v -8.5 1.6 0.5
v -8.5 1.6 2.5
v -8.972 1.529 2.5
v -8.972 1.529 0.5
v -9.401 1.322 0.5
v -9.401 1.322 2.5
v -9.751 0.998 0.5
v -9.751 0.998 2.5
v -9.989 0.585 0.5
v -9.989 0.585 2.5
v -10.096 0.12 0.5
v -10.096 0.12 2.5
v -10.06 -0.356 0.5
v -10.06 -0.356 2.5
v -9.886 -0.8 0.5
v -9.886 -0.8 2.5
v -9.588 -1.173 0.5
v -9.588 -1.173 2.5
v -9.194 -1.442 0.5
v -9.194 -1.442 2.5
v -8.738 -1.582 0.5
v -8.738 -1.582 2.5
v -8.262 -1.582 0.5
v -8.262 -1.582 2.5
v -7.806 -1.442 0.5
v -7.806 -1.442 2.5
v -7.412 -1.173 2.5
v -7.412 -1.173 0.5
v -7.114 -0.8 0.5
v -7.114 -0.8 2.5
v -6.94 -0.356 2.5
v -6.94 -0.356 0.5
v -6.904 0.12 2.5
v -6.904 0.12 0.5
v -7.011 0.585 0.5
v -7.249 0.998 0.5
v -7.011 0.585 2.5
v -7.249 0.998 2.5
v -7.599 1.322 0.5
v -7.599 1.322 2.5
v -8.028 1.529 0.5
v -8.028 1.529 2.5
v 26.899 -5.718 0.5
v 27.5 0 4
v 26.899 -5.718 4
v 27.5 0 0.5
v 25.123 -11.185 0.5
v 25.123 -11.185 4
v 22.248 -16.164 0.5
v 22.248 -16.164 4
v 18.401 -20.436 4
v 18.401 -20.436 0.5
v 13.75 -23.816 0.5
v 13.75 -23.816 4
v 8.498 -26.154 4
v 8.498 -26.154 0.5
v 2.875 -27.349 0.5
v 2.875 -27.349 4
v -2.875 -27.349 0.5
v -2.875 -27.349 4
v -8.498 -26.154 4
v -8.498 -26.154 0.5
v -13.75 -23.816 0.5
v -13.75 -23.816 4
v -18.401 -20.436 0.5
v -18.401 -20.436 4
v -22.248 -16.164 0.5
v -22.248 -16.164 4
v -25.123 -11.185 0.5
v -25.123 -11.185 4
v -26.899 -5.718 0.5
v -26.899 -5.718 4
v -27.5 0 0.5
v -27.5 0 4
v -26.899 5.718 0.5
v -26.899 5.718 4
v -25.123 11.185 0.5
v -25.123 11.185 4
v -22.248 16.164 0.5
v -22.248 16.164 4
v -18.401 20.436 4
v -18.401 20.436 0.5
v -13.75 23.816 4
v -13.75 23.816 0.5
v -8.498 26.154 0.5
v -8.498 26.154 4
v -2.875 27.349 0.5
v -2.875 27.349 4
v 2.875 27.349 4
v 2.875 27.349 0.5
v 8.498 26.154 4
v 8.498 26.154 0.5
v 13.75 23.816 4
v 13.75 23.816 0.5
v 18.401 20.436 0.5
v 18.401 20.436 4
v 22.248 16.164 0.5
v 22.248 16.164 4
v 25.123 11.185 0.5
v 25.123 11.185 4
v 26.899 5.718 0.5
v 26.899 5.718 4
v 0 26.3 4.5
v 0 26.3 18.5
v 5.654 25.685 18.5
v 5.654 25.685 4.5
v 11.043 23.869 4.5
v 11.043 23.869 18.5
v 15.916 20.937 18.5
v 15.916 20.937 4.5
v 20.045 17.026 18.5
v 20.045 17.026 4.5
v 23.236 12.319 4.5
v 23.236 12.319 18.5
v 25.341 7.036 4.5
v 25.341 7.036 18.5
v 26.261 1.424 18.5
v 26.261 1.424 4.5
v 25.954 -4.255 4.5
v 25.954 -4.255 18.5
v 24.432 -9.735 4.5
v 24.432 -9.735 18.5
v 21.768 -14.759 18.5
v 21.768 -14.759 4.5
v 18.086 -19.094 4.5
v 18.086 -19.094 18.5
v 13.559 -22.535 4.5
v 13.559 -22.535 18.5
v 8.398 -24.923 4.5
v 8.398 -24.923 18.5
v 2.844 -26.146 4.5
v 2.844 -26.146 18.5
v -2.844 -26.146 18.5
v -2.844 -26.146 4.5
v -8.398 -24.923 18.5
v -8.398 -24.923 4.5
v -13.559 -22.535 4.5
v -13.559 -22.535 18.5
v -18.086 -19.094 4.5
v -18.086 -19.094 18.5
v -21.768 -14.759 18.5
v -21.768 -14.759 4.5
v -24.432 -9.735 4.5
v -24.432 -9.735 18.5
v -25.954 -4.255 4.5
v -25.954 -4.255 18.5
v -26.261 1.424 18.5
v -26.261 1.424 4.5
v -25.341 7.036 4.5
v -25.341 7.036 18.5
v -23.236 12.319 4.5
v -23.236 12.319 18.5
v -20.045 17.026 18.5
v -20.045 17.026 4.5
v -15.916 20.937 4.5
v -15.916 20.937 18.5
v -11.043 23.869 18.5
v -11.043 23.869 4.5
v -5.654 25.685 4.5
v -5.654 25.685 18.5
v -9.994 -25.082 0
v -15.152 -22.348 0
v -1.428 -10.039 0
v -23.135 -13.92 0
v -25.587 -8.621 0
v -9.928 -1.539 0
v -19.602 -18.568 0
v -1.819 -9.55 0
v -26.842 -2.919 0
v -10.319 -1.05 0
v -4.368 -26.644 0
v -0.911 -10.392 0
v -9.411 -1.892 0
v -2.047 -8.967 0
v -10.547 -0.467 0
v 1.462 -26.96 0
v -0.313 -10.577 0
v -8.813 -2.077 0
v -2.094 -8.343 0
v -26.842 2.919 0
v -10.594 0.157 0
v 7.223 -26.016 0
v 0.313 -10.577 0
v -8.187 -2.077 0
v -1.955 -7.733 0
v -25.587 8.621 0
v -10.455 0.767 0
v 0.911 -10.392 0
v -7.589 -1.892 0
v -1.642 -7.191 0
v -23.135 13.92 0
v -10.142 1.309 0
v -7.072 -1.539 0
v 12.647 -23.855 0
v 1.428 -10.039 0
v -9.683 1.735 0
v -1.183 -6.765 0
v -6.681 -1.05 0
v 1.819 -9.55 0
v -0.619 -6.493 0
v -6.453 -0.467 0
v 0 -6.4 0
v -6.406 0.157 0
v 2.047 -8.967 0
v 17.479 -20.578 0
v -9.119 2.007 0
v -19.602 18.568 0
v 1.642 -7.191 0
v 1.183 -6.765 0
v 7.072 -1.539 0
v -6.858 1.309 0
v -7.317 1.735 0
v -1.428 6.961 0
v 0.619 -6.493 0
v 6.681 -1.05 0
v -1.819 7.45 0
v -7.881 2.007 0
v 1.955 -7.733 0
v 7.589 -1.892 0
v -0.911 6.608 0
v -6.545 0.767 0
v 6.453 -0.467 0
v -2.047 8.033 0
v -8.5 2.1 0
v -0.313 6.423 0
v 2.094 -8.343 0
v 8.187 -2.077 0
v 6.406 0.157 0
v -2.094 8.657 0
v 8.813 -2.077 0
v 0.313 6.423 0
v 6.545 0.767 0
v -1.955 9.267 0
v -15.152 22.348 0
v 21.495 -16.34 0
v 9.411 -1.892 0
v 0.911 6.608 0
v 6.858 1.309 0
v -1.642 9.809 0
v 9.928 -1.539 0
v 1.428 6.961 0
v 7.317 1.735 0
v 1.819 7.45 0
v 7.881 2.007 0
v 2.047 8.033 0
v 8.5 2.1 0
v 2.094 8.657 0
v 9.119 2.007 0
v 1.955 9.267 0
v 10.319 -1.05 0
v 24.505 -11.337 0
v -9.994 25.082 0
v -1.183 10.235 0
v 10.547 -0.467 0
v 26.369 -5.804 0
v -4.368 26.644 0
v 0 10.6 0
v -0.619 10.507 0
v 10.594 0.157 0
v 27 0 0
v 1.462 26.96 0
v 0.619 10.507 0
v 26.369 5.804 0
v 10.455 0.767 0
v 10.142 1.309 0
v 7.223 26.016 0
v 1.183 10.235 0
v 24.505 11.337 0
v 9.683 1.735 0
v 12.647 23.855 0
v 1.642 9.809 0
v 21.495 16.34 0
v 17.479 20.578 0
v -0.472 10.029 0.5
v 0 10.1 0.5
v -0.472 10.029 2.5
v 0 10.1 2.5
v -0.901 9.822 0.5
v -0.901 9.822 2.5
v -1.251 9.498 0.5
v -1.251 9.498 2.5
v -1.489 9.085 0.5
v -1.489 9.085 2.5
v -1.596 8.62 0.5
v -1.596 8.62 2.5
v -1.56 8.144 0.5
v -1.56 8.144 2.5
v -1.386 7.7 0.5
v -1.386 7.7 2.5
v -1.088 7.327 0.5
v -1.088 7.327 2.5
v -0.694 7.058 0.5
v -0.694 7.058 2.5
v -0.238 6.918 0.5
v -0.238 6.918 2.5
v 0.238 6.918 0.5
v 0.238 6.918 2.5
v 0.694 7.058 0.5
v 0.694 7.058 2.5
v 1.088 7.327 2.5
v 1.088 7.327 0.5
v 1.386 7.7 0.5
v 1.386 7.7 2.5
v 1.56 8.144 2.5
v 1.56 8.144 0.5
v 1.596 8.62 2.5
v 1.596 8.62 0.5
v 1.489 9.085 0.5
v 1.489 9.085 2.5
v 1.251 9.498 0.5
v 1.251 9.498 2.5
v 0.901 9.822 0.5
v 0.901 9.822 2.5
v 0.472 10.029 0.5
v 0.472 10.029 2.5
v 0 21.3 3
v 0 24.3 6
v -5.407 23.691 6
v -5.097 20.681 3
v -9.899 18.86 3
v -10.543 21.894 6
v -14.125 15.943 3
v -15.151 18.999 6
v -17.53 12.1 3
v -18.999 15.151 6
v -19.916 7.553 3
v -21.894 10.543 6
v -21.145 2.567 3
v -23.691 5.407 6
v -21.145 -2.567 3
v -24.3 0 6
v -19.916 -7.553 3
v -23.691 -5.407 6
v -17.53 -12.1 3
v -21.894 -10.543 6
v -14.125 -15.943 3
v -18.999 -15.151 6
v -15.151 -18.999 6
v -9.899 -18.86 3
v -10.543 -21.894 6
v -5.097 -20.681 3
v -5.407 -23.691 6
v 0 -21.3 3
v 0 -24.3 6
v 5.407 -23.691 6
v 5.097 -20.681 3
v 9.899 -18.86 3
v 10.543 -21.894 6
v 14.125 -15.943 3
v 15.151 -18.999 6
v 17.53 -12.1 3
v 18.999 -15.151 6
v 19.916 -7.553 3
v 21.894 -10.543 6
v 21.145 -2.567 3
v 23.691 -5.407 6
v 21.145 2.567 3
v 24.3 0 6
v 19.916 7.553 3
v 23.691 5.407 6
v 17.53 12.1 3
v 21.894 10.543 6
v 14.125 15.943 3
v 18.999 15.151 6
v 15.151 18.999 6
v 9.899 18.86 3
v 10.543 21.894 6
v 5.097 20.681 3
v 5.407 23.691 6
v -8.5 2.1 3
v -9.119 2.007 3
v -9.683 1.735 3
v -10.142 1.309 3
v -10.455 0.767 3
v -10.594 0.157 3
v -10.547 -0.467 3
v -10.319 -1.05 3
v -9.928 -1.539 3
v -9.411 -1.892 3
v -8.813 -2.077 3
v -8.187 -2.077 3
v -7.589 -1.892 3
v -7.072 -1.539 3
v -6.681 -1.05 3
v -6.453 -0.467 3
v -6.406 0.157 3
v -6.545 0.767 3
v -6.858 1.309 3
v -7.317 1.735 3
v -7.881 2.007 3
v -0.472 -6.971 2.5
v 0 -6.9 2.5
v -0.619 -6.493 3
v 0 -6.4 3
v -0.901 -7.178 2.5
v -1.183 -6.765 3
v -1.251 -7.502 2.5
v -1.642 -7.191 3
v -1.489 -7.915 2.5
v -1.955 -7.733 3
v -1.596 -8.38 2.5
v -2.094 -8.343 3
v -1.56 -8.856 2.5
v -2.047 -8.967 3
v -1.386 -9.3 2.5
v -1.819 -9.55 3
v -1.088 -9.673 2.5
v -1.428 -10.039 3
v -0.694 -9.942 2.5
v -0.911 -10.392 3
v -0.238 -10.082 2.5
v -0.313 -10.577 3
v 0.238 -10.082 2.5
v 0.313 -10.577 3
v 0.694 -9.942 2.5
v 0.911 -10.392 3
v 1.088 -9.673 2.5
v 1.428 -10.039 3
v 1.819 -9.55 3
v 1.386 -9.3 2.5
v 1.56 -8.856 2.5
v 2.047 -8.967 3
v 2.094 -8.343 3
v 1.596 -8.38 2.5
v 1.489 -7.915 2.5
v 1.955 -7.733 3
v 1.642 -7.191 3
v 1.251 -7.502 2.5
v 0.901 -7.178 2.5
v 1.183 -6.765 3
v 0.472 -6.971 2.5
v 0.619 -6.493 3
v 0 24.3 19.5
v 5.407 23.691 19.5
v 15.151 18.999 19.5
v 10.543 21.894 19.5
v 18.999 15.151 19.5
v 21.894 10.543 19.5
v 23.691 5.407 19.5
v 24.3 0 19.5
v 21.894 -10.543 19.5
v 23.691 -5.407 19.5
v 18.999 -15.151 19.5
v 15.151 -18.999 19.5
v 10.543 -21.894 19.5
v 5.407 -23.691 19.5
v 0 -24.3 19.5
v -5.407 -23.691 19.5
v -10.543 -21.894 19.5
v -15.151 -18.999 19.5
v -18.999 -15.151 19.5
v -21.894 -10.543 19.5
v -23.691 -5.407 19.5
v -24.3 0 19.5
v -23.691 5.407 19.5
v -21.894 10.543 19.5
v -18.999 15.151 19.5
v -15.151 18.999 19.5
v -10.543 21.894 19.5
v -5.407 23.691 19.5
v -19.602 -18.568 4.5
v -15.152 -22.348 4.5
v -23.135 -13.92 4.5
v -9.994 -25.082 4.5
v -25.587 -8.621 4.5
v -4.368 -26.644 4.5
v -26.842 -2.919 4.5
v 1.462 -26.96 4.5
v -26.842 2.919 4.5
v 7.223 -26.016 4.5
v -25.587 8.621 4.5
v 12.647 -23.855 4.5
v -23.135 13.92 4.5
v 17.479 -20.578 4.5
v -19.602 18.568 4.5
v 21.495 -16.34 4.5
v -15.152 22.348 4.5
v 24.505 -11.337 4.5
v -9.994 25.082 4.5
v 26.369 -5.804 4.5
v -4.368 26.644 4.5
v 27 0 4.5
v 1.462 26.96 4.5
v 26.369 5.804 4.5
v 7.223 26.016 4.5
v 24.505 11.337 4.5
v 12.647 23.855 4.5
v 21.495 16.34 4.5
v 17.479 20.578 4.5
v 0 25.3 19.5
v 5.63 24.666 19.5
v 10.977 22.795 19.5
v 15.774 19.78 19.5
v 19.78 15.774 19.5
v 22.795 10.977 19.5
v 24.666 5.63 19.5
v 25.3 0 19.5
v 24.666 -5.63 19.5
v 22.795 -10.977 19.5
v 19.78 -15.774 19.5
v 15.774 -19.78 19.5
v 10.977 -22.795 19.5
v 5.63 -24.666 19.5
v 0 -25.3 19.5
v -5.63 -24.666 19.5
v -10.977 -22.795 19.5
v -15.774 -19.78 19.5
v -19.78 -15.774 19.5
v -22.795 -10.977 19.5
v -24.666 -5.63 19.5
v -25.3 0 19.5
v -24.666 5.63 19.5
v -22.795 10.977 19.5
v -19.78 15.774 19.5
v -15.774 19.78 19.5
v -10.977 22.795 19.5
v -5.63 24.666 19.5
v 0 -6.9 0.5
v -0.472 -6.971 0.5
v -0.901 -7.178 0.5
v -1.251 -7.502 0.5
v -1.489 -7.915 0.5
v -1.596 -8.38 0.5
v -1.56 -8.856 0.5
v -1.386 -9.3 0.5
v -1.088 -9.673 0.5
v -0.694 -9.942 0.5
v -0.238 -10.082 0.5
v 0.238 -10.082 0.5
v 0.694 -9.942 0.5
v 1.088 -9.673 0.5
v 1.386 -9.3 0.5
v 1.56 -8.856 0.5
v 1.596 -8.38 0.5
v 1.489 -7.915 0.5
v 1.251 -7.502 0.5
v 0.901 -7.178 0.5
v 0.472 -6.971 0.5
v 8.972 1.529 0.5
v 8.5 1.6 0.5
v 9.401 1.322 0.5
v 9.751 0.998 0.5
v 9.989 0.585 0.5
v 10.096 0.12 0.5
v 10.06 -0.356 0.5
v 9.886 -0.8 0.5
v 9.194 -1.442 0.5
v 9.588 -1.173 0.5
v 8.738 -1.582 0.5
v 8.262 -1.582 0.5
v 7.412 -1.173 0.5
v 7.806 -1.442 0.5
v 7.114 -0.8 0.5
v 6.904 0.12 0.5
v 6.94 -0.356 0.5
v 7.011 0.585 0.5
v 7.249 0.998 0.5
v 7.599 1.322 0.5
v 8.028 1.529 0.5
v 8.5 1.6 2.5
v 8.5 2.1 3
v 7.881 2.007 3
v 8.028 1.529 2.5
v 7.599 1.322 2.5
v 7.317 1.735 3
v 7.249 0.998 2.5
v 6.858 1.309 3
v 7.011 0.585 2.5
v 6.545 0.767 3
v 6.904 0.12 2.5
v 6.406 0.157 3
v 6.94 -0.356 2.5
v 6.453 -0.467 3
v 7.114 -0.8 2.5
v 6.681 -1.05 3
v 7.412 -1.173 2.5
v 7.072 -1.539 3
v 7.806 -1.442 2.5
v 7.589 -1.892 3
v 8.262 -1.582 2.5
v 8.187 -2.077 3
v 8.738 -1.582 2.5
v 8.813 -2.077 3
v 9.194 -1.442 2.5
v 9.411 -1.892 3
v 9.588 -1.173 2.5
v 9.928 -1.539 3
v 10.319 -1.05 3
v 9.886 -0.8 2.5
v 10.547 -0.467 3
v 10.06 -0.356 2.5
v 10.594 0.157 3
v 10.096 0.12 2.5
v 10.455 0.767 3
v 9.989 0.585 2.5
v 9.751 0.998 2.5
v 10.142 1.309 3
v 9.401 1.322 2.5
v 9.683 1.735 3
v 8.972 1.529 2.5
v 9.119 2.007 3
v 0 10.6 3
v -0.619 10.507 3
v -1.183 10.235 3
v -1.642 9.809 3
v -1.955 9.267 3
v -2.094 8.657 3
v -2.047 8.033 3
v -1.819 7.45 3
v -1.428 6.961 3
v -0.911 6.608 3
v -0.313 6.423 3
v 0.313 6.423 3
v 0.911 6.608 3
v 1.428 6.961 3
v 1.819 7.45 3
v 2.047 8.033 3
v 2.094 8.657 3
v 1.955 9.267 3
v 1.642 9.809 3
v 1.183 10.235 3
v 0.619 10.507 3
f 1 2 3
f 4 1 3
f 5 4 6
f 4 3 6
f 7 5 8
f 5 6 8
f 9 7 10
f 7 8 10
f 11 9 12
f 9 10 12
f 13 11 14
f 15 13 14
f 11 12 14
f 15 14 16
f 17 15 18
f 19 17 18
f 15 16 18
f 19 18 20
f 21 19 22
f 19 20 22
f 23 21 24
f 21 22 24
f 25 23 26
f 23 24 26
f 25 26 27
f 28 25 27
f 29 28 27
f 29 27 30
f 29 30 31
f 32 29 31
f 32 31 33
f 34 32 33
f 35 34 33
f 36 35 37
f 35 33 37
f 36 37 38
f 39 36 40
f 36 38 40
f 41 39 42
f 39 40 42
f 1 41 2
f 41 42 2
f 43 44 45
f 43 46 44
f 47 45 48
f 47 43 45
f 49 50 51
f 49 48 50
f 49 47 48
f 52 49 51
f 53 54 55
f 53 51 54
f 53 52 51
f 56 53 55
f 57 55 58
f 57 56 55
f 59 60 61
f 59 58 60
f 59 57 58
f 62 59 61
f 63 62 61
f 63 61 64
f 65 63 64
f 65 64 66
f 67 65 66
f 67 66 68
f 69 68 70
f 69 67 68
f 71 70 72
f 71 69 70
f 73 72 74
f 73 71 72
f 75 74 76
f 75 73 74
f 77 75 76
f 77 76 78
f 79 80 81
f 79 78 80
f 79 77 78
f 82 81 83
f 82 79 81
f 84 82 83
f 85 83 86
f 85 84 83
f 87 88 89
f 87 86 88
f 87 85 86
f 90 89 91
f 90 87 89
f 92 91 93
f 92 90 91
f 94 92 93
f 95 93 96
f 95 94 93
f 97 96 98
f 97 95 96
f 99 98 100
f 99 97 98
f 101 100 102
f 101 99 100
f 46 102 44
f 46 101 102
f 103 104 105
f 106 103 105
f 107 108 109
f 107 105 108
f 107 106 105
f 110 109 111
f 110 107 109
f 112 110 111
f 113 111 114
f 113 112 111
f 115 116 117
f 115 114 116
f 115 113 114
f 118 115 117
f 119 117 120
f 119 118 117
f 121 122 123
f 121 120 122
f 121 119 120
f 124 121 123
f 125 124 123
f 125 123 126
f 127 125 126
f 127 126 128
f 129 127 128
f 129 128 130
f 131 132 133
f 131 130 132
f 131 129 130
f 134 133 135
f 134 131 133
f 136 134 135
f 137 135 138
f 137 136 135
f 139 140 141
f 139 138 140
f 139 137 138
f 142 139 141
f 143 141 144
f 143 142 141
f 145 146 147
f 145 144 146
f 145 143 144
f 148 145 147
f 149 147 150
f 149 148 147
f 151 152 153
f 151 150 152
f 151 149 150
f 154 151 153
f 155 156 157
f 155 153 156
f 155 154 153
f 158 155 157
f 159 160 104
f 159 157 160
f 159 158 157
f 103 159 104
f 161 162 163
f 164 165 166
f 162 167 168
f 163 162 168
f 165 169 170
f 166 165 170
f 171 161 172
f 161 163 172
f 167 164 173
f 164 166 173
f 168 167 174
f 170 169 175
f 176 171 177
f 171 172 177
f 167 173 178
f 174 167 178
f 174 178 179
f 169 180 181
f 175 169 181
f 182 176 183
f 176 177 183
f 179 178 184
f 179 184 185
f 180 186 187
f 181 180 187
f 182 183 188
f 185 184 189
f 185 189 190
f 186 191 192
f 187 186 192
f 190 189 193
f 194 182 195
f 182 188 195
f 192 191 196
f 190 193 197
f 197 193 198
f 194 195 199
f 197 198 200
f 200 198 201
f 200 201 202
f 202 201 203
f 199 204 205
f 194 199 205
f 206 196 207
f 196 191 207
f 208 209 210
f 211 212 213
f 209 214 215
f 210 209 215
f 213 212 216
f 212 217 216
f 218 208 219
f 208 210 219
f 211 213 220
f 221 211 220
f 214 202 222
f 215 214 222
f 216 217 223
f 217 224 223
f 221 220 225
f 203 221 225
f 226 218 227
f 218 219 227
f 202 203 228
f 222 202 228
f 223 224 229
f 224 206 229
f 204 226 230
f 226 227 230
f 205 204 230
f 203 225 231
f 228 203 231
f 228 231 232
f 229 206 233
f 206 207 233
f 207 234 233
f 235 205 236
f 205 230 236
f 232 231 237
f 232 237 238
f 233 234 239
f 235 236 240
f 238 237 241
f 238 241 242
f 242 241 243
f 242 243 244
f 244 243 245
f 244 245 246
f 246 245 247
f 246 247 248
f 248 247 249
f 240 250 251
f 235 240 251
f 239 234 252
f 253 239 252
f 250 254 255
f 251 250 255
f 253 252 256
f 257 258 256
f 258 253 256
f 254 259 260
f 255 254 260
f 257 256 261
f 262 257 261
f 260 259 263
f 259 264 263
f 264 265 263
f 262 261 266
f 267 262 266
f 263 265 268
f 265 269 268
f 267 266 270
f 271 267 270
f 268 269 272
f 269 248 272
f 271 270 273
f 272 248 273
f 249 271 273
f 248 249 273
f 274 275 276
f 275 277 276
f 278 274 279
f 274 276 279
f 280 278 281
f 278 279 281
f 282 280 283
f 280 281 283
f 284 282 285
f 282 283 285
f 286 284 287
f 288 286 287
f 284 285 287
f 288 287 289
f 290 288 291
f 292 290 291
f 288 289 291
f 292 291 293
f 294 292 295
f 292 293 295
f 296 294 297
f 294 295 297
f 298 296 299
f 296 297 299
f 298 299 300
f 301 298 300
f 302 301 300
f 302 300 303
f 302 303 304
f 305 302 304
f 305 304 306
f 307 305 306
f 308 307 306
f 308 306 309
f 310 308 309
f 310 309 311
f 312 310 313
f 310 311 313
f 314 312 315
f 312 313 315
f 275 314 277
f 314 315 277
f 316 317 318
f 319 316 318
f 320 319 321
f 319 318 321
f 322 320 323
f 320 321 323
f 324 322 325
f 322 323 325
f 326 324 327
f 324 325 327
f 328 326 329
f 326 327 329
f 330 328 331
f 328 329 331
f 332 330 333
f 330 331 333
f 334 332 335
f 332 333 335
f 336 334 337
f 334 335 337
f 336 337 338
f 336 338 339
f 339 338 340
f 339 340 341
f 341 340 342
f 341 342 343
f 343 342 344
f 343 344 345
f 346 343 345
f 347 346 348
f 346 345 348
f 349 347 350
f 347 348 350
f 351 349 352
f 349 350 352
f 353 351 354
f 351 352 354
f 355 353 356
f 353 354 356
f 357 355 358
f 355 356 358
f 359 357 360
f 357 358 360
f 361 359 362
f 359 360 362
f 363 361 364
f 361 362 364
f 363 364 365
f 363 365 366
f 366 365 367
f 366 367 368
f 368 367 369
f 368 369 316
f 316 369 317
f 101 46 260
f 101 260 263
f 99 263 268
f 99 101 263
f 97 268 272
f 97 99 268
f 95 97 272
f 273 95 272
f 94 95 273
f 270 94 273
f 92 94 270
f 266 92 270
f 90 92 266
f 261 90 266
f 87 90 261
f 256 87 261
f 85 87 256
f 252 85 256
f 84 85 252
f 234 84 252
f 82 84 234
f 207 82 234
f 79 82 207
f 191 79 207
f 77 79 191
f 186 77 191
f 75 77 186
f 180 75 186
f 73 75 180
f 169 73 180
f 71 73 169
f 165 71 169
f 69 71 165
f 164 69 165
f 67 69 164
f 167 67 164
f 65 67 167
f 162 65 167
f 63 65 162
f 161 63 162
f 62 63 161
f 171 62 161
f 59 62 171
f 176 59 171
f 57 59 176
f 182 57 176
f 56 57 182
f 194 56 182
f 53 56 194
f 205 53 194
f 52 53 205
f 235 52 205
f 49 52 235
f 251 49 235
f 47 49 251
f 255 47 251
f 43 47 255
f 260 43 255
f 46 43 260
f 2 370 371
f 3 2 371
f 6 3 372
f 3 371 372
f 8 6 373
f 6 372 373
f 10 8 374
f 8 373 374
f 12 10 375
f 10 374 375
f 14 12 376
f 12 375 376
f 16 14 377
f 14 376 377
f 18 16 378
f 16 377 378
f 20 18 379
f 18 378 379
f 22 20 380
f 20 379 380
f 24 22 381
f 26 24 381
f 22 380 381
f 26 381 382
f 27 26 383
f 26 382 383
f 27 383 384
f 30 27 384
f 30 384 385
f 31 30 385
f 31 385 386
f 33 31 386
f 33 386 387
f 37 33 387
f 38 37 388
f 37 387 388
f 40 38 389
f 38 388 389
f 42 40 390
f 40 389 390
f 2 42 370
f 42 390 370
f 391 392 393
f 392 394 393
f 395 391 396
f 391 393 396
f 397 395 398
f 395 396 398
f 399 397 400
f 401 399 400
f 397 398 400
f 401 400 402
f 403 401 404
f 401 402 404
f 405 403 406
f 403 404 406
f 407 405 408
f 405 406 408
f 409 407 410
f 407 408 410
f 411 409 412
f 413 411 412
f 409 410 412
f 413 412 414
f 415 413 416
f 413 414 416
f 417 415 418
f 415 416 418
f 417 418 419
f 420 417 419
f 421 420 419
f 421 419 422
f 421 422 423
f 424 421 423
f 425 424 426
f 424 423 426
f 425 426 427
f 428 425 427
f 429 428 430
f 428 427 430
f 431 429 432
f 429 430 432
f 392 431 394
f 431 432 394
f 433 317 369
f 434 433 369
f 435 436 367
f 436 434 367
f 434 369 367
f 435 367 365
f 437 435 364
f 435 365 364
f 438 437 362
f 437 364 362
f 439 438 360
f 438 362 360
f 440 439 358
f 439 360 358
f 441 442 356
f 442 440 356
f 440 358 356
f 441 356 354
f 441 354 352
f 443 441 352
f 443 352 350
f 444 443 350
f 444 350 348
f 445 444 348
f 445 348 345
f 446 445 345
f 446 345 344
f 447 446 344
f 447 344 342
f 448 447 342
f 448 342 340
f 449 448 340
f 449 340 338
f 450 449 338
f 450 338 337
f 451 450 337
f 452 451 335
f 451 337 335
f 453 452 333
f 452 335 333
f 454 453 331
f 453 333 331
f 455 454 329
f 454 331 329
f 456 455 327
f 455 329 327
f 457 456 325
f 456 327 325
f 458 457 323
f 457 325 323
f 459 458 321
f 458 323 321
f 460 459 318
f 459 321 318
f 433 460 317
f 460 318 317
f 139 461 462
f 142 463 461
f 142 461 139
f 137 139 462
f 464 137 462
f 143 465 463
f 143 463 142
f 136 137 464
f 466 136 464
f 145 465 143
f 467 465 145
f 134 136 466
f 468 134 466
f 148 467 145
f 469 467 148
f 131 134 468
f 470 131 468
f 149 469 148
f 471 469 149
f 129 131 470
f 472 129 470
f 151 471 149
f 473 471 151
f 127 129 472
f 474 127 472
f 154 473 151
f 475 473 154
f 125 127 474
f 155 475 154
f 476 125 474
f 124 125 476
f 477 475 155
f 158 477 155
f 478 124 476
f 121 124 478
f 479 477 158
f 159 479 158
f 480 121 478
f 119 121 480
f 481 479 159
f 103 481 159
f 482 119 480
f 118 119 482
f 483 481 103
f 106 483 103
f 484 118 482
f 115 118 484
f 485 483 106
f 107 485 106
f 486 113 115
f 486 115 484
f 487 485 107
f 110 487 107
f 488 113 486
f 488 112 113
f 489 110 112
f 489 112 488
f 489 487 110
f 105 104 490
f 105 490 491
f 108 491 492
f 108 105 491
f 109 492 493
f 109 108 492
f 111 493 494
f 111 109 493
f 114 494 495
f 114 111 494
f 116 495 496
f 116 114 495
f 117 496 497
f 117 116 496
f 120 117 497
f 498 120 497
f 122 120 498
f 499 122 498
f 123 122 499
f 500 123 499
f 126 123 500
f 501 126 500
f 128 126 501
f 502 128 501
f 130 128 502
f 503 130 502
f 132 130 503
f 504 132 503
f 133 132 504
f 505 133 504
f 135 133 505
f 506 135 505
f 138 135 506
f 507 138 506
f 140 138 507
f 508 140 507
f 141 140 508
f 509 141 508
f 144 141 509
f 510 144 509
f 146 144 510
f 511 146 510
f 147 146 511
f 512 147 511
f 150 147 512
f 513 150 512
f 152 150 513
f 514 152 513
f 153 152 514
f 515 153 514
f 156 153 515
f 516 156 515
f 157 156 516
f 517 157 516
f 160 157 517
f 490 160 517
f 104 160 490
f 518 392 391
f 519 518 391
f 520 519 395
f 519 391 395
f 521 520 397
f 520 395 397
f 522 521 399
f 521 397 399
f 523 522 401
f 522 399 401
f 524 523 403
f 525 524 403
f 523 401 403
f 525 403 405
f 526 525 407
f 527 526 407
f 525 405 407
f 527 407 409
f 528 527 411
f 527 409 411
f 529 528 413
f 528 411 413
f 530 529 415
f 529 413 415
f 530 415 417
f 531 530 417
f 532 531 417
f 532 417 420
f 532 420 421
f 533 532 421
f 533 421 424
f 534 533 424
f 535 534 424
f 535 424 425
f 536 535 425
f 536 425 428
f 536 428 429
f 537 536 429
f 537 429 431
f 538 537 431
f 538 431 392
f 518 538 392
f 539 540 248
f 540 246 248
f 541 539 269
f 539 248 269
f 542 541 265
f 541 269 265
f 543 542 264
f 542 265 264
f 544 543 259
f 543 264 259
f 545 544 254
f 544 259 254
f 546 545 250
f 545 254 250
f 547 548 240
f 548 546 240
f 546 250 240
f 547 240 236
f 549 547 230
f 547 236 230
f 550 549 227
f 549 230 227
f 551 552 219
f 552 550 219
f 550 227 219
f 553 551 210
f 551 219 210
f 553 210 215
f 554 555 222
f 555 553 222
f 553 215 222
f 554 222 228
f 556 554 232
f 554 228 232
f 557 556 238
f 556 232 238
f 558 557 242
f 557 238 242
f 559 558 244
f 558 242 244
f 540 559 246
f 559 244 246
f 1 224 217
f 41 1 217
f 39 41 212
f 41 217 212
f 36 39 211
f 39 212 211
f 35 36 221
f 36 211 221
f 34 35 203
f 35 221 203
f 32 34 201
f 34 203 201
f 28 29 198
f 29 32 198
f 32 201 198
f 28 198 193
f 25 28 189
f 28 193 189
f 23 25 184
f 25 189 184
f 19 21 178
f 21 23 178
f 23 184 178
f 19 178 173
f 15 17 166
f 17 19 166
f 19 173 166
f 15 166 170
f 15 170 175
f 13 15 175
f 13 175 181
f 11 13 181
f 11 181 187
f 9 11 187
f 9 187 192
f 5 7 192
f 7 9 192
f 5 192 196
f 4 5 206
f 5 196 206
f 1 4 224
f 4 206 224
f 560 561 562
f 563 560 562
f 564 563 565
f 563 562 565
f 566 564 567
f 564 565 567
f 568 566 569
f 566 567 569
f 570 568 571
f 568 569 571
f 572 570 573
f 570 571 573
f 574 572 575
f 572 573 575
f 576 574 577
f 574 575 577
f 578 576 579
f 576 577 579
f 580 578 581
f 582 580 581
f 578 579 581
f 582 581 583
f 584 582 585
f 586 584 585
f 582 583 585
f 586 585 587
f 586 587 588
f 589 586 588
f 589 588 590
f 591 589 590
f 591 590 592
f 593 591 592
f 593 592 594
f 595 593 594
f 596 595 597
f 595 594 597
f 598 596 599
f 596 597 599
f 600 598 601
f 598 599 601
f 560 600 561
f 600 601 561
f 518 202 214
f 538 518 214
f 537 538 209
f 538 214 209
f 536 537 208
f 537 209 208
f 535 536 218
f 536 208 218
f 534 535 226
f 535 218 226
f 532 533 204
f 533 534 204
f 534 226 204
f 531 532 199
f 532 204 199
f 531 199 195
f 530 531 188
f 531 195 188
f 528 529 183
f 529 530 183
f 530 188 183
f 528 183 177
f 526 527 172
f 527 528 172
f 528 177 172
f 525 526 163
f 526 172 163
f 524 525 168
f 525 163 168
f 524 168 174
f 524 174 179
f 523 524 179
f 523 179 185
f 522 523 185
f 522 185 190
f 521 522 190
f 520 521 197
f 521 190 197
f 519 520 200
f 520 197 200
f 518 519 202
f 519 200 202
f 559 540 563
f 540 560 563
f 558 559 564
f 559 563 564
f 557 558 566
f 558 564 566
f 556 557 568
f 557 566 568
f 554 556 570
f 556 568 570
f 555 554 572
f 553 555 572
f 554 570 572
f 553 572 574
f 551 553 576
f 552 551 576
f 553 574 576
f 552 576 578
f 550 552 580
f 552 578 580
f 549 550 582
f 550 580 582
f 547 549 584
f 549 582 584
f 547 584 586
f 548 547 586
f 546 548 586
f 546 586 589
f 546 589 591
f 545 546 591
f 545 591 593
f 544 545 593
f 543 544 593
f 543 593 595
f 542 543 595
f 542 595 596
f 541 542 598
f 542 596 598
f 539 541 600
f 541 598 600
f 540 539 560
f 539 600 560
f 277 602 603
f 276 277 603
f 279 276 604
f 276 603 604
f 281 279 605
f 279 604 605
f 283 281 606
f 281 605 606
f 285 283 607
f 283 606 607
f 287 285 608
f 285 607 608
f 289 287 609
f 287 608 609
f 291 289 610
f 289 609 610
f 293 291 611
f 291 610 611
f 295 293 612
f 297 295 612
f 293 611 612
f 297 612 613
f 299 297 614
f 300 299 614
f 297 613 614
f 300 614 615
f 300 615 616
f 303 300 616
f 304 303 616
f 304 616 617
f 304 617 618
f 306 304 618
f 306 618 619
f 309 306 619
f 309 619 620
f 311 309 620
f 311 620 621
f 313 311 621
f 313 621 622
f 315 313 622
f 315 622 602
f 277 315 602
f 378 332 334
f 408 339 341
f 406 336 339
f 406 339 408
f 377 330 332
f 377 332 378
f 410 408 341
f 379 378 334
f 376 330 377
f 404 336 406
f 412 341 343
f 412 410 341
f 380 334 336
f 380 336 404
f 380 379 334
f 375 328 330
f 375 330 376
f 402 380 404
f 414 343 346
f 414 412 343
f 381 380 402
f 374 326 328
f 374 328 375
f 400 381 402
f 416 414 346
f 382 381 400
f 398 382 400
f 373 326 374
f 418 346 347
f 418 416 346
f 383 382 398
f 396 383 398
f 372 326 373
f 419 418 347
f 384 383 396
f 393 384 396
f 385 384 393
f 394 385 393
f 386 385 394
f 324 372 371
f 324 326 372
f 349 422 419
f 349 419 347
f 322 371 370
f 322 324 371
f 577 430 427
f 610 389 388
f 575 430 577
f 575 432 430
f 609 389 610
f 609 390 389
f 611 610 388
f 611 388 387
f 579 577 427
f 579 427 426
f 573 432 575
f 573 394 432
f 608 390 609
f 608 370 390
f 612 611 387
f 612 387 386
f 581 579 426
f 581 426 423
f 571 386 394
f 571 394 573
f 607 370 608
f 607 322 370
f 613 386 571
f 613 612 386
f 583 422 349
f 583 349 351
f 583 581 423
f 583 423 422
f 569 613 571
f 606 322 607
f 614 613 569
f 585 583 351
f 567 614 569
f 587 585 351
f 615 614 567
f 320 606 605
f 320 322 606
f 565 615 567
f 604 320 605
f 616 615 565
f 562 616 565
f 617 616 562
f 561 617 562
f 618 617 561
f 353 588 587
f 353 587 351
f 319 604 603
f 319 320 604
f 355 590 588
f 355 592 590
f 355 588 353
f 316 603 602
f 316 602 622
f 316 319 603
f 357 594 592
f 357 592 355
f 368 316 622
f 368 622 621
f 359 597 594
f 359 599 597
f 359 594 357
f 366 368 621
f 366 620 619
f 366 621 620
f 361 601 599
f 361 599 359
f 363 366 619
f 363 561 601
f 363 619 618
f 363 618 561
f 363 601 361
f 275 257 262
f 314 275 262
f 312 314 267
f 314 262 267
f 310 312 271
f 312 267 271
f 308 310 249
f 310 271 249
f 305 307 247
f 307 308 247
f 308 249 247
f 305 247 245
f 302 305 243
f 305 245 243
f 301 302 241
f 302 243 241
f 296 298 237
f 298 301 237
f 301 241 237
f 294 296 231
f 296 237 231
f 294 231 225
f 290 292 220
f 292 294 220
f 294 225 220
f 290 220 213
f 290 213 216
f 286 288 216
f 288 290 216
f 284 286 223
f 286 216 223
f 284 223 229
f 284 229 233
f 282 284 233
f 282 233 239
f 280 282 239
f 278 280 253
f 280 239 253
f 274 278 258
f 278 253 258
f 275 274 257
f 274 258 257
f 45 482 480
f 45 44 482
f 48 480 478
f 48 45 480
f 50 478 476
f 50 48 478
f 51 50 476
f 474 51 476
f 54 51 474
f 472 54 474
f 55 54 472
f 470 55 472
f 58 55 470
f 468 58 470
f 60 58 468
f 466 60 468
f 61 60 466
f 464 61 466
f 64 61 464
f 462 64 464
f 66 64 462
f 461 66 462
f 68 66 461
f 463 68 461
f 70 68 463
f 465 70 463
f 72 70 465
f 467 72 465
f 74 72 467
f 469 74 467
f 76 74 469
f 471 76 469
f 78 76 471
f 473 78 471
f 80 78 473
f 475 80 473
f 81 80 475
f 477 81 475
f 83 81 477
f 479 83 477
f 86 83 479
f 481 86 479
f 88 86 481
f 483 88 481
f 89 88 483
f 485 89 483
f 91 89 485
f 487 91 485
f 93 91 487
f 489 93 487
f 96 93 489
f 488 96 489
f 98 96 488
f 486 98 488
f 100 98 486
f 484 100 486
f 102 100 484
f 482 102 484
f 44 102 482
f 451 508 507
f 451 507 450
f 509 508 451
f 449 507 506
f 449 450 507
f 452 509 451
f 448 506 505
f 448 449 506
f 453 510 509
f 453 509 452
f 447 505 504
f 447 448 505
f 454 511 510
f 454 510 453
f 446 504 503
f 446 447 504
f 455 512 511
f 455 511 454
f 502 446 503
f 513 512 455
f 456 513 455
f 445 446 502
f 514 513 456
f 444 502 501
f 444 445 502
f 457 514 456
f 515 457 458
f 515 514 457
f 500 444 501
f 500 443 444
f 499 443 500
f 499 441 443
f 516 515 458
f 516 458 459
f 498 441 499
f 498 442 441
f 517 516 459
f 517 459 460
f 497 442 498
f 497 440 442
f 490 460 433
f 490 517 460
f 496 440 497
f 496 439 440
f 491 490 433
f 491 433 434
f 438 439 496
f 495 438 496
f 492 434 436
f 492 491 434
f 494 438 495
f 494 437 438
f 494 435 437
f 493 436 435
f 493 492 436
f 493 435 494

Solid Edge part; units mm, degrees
sketch "Sketch1" plane through (0, 0, 0) normal (0, 0, 1) x (1, 0, 0)
  circle A0 centre (0, 0) radius 27.5
  dimension "D1" = 55
extrude "Protrusion1" add sketch "Sketch1" along normal blind 4.5
sketch "Sketch2" plane through (0, 0, 4.5) normal (0, 0, 1) x (0, 1, 0)
  circle A0 centre (0, 0) radius 24.3
  circle A1 centre (0, 0) radius 26.3
extrude "ExtrudedProtrusion_2" add sketch "Sketch2" along normal blind 15
sketch "Sketch3" plane through (0, 0, 4.5) normal (0, 0, 1) x (0, 1, 0)
  circle A0 centre (0, 0) radius 24.3
extrude "ExtrudedCutout_1" cut sketch "Sketch3" against normal blind 1.5
chamfer "Letörés_1" distance 1 angle 45 1 edges at (0, -26.3, 19.5)
chamfer "Letörés_2" distance 0.5 angle 45 2 edges at (-27.5, 0, 4.5) (-27.5, 0, 0)
sketch "Sketch4" plane through (0, 0, 3) normal (0, 0, 1) x (0, 1, 0)
  circle A0 centre (0, -8.5) radius 1.6
  circle A1 centre (-8.5, 0) radius 1.6
  circle A2 centre (8.5, 0) radius 1.6
  circle A3 centre (0, 8.5) radius 1.6
  dimension "D1" = 3.2
  dimension "D2" = 17
  dimension "D3" = 17
  dimension "D4" = 8.5
  dimension "D5" = 8.5
extrude "ExtrudedCutout_2" cut sketch "Sketch4" against normal blind 7
chamfer "Letörés_3" distance 3 angle 45 1 edges at (0, -24.3, 3)
chamfer "Letörés_4" distance 0.5 angle 45 8 edges at (-6.9, 0, 0) (-8.5, -1.6, 3) (1.6, 8.5, 0) (0, 6.9, 3) (1.6, -8.5, 0) (0, -10.1, 3) (10.1, 0, 0) (8.5, -1.6, 3)
